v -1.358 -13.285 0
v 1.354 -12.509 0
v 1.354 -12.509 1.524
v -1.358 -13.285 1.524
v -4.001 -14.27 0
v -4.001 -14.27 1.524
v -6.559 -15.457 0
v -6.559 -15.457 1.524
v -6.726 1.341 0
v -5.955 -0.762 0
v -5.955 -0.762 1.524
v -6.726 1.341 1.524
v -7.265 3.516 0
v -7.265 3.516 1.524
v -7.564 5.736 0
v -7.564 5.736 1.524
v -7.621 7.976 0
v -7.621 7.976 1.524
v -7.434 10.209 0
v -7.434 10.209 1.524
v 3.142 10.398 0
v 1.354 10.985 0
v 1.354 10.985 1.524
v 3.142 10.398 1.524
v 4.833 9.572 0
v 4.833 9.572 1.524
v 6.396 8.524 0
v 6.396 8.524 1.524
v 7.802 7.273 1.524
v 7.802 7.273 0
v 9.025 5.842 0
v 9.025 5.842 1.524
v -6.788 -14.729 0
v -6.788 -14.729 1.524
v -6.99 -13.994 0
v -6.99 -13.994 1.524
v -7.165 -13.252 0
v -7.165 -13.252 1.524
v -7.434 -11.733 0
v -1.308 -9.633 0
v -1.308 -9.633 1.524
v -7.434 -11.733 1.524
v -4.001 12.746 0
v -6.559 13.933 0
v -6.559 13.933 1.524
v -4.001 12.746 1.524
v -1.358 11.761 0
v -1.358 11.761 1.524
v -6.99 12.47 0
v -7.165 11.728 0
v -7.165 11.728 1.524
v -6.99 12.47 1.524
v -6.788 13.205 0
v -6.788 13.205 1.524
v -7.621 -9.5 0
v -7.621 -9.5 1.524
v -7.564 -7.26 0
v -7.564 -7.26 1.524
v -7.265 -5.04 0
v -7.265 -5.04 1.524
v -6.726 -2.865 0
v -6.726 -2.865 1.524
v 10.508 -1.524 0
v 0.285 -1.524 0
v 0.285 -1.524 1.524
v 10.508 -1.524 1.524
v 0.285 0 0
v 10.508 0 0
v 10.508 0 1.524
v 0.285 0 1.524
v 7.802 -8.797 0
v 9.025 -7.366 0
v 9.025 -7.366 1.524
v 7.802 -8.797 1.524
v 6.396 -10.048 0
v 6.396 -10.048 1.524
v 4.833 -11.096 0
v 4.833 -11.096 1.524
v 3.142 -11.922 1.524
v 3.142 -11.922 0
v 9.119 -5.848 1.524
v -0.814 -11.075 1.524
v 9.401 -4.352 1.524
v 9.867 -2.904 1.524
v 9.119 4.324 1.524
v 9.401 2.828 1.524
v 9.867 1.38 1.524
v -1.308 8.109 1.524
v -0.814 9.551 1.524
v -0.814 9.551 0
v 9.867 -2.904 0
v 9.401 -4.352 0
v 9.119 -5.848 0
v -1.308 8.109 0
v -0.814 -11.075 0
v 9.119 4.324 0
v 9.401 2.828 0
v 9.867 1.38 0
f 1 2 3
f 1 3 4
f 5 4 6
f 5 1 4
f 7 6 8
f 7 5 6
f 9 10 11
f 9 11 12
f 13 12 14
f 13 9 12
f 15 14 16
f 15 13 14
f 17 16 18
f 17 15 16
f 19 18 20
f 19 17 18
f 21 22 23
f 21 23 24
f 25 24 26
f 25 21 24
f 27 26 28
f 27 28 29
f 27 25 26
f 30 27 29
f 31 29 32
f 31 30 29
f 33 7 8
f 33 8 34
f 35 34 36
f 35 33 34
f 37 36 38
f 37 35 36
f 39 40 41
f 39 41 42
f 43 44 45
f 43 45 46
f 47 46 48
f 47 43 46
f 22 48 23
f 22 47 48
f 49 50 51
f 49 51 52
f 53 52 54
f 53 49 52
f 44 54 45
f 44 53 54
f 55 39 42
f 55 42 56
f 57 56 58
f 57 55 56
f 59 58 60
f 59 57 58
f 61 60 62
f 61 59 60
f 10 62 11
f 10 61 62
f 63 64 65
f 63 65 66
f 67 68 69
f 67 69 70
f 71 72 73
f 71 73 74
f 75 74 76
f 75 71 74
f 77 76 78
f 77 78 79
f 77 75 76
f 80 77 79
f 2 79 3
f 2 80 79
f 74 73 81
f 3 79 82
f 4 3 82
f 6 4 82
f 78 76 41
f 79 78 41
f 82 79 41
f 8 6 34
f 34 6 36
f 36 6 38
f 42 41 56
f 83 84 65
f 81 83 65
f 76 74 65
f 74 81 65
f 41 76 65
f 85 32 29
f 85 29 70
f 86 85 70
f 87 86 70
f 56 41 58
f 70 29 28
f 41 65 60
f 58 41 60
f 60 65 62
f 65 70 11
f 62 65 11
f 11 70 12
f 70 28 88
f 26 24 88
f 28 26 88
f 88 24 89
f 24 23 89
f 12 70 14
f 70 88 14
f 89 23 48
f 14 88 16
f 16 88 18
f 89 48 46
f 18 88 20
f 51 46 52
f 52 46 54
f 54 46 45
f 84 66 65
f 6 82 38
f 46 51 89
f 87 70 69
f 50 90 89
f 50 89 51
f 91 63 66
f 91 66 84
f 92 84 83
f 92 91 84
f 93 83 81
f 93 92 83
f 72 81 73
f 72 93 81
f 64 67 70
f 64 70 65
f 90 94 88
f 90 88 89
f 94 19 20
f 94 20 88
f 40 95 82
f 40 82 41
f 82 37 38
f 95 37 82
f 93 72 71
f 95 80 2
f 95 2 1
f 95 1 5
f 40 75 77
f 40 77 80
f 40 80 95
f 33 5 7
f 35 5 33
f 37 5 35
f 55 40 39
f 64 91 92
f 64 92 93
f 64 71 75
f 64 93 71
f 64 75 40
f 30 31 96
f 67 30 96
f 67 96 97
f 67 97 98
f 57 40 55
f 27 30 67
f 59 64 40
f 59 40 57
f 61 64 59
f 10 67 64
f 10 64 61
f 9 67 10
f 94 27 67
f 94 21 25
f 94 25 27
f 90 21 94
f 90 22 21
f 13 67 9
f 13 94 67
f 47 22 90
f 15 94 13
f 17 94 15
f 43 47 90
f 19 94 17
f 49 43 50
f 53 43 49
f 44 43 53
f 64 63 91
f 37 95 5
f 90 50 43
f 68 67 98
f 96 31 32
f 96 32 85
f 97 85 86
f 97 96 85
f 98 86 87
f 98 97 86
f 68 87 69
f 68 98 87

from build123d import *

# Parameters (mm, degrees)
BOSS_EXTRUDE1_DEPTH = 1.524


with BuildPart() as part:
    # Sketch1 → Boss-Extrude1 (new body)
    with BuildSketch(Plane.XY):
        with BuildLine():
            Line((0.285426682, 0), (0.285426682, -1.524))
            Line((0.285426682, -1.524), (10.508401923, -1.524))
            ThreePointArc((10.508401923, -1.524), (9.401321759, -4.352342754), (9.024565628, -7.366178191))
            ThreePointArc((9.024565628, -7.366178191), (5.632541896, -10.599139275), (1.353650751, -12.509362545))
            ThreePointArc((1.353650751, -12.509362545), (-2.688908753, -13.751919893), (-6.559224402, -15.456881148))
            ThreePointArc((-6.559224402, -15.456881148), (-6.892797133, -14.362674131), (-7.1651622, -13.251648913))
            Line((-7.1651622, -13.251648913), (-0.813548275, -11.074651995))
            Line((-0.813548275, -11.074651995), (-1.307676516, -9.632981686))
            Line((-1.307676516, -9.632981686), (-7.434081645, -11.732788954))
            ThreePointArc((-7.434081645, -11.732788954), (-7.444704809, -6.146254485), (-5.954978709, -0.762))
            ThreePointArc((-5.954978709, -0.762), (-7.444704809, 4.622254485), (-7.434081645, 10.208788954))
            Line((-7.434081645, 10.208788954), (-1.307676516, 8.108981686))
            Line((-1.307676516, 8.108981686), (-0.813548275, 9.550651995))
            Line((-0.813548275, 9.550651995), (-7.1651622, 11.727648913))
            ThreePointArc((-7.1651622, 11.727648913), (-6.892797133, 12.838674131), (-6.559224402, 13.932881148))
            ThreePointArc((-6.559224402, 13.932881148), (-2.688908753, 12.227919893), (1.353650751, 10.985362545))
            ThreePointArc((1.353650751, 10.985362545), (5.632541896, 9.075139275), (9.024565628, 5.842178191))
            ThreePointArc((9.024565628, 5.842178191), (9.401321759, 2.828342754), (10.508401923, 0))
            Line((10.508401923, 0), (0.285426682, 0))
        make_face()
    extrude(amount=BOSS_EXTRUDE1_DEPTH)


solid = part.part
